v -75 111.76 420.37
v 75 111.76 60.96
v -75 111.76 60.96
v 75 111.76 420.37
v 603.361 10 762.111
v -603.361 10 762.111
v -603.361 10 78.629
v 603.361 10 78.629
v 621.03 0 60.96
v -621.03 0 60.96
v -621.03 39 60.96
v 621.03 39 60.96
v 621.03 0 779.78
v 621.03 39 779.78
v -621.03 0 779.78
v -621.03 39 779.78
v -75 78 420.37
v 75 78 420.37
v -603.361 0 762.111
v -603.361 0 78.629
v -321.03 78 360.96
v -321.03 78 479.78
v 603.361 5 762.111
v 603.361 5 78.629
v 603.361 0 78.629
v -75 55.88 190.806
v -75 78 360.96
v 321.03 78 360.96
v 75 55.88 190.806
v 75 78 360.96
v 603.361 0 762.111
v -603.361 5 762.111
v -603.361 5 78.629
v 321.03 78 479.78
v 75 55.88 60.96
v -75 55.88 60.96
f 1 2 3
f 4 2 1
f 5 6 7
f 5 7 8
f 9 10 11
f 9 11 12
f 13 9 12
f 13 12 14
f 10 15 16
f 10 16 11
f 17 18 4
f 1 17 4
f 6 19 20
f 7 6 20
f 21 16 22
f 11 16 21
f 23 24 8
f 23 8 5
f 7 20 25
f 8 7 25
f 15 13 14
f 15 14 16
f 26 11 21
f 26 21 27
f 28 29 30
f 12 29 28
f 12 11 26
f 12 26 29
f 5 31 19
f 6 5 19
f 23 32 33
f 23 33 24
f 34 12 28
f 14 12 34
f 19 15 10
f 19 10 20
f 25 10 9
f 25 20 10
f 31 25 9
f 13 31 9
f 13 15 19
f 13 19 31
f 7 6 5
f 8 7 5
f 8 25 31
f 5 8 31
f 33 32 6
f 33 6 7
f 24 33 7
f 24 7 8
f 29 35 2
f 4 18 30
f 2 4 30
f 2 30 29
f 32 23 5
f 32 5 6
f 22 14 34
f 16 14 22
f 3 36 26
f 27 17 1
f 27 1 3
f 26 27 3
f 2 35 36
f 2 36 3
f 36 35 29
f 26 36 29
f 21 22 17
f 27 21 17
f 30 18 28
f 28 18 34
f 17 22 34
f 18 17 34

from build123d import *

# Parameters (mm, degrees)
F2_DEPTH      = 78
F3_DEPTH      = 10
F4_START      = -5
F4_DEPTH      = 5
F5_SIZE2      = 39
F5_SIZE       = 300
F1_W          = 55.88
F1_H          = 359.41
F6_DEPTH      = 75
F6_DEPTH_BACK = 75


with BuildPart() as f2:
    # F0 (on Front) → F2 (new body)
    with BuildSketch(Plane.XZ):
        Polygon((0, 779.78), (-621.03, 779.78), (-621.03, 420.37), (-603.3609412751, 420.37), (-603.3609412751, 762.1109412751), (0, 762.1109412751), align=None)
        Polygon((621.03, 779.78), (0, 779.78), (0, 762.1109412751), (603.3609412751, 762.1109412751), (603.3609412751, 78.6290587249), (-603.3609412751, 78.6290587249), (-603.3609412751, 420.37), (-621.03, 420.37), (-621.03, 60.96), (0, 60.96), (621.03, 60.96), align=None)
        Polygon((603.3609412751, 762.1109412751), (0, 762.1109412751), (-603.3609412751, 762.1109412751), (-603.3609412751, 420.37), (-603.3609412751, 78.6290587249), (603.3609412751, 78.6290587249), align=None)
    extrude(amount=-F2_DEPTH)

    # F0 (on Front) → F3 (cut)
    with BuildSketch(Plane.XZ):
        Polygon((603.3609412751, 762.1109412751), (0, 762.1109412751), (-603.3609412751, 762.1109412751), (-603.3609412751, 420.37), (-603.3609412751, 78.6290587249), (603.3609412751, 78.6290587249), align=None)
    extrude(amount=-F3_DEPTH, mode=Mode.SUBTRACT)

    # F5
    f5_edges = [f2.edges().sort_by_distance(p)[0] for p in [
        (0, 78, 779.78),
        (-621.03, 78, 420.37),
        (0, 78, 60.96),
        (621.03, 78, 420.37),
    ]]
    f5_side = f2.faces().sort_by_distance((0, 78, 420.37))[0]
    chamfer(f5_edges, length=F5_SIZE, length2=F5_SIZE2, reference=f5_side)

    # F1 (on Right) → F6 (join, two sides)
    with BuildSketch(Plane.YZ) as f6_sk:
        with Locations((83.82, 240.665)):
            Rectangle(F1_W, F1_H)
    extrude(amount=F6_DEPTH)
    extrude(f6_sk.sketch, amount=-F6_DEPTH_BACK)


with BuildPart() as f4:
    # F0 (on Front) → F4 (new body)
    with BuildSketch(Plane.XZ.offset(F4_START)):
        Polygon((603.3609412751, 762.1109412751), (0, 762.1109412751), (-603.3609412751, 762.1109412751), (-603.3609412751, 420.37), (-603.3609412751, 78.6290587249), (603.3609412751, 78.6290587249), align=None)
    extrude(amount=-F4_DEPTH)


solid = Compound([f2.part, f4.part])
